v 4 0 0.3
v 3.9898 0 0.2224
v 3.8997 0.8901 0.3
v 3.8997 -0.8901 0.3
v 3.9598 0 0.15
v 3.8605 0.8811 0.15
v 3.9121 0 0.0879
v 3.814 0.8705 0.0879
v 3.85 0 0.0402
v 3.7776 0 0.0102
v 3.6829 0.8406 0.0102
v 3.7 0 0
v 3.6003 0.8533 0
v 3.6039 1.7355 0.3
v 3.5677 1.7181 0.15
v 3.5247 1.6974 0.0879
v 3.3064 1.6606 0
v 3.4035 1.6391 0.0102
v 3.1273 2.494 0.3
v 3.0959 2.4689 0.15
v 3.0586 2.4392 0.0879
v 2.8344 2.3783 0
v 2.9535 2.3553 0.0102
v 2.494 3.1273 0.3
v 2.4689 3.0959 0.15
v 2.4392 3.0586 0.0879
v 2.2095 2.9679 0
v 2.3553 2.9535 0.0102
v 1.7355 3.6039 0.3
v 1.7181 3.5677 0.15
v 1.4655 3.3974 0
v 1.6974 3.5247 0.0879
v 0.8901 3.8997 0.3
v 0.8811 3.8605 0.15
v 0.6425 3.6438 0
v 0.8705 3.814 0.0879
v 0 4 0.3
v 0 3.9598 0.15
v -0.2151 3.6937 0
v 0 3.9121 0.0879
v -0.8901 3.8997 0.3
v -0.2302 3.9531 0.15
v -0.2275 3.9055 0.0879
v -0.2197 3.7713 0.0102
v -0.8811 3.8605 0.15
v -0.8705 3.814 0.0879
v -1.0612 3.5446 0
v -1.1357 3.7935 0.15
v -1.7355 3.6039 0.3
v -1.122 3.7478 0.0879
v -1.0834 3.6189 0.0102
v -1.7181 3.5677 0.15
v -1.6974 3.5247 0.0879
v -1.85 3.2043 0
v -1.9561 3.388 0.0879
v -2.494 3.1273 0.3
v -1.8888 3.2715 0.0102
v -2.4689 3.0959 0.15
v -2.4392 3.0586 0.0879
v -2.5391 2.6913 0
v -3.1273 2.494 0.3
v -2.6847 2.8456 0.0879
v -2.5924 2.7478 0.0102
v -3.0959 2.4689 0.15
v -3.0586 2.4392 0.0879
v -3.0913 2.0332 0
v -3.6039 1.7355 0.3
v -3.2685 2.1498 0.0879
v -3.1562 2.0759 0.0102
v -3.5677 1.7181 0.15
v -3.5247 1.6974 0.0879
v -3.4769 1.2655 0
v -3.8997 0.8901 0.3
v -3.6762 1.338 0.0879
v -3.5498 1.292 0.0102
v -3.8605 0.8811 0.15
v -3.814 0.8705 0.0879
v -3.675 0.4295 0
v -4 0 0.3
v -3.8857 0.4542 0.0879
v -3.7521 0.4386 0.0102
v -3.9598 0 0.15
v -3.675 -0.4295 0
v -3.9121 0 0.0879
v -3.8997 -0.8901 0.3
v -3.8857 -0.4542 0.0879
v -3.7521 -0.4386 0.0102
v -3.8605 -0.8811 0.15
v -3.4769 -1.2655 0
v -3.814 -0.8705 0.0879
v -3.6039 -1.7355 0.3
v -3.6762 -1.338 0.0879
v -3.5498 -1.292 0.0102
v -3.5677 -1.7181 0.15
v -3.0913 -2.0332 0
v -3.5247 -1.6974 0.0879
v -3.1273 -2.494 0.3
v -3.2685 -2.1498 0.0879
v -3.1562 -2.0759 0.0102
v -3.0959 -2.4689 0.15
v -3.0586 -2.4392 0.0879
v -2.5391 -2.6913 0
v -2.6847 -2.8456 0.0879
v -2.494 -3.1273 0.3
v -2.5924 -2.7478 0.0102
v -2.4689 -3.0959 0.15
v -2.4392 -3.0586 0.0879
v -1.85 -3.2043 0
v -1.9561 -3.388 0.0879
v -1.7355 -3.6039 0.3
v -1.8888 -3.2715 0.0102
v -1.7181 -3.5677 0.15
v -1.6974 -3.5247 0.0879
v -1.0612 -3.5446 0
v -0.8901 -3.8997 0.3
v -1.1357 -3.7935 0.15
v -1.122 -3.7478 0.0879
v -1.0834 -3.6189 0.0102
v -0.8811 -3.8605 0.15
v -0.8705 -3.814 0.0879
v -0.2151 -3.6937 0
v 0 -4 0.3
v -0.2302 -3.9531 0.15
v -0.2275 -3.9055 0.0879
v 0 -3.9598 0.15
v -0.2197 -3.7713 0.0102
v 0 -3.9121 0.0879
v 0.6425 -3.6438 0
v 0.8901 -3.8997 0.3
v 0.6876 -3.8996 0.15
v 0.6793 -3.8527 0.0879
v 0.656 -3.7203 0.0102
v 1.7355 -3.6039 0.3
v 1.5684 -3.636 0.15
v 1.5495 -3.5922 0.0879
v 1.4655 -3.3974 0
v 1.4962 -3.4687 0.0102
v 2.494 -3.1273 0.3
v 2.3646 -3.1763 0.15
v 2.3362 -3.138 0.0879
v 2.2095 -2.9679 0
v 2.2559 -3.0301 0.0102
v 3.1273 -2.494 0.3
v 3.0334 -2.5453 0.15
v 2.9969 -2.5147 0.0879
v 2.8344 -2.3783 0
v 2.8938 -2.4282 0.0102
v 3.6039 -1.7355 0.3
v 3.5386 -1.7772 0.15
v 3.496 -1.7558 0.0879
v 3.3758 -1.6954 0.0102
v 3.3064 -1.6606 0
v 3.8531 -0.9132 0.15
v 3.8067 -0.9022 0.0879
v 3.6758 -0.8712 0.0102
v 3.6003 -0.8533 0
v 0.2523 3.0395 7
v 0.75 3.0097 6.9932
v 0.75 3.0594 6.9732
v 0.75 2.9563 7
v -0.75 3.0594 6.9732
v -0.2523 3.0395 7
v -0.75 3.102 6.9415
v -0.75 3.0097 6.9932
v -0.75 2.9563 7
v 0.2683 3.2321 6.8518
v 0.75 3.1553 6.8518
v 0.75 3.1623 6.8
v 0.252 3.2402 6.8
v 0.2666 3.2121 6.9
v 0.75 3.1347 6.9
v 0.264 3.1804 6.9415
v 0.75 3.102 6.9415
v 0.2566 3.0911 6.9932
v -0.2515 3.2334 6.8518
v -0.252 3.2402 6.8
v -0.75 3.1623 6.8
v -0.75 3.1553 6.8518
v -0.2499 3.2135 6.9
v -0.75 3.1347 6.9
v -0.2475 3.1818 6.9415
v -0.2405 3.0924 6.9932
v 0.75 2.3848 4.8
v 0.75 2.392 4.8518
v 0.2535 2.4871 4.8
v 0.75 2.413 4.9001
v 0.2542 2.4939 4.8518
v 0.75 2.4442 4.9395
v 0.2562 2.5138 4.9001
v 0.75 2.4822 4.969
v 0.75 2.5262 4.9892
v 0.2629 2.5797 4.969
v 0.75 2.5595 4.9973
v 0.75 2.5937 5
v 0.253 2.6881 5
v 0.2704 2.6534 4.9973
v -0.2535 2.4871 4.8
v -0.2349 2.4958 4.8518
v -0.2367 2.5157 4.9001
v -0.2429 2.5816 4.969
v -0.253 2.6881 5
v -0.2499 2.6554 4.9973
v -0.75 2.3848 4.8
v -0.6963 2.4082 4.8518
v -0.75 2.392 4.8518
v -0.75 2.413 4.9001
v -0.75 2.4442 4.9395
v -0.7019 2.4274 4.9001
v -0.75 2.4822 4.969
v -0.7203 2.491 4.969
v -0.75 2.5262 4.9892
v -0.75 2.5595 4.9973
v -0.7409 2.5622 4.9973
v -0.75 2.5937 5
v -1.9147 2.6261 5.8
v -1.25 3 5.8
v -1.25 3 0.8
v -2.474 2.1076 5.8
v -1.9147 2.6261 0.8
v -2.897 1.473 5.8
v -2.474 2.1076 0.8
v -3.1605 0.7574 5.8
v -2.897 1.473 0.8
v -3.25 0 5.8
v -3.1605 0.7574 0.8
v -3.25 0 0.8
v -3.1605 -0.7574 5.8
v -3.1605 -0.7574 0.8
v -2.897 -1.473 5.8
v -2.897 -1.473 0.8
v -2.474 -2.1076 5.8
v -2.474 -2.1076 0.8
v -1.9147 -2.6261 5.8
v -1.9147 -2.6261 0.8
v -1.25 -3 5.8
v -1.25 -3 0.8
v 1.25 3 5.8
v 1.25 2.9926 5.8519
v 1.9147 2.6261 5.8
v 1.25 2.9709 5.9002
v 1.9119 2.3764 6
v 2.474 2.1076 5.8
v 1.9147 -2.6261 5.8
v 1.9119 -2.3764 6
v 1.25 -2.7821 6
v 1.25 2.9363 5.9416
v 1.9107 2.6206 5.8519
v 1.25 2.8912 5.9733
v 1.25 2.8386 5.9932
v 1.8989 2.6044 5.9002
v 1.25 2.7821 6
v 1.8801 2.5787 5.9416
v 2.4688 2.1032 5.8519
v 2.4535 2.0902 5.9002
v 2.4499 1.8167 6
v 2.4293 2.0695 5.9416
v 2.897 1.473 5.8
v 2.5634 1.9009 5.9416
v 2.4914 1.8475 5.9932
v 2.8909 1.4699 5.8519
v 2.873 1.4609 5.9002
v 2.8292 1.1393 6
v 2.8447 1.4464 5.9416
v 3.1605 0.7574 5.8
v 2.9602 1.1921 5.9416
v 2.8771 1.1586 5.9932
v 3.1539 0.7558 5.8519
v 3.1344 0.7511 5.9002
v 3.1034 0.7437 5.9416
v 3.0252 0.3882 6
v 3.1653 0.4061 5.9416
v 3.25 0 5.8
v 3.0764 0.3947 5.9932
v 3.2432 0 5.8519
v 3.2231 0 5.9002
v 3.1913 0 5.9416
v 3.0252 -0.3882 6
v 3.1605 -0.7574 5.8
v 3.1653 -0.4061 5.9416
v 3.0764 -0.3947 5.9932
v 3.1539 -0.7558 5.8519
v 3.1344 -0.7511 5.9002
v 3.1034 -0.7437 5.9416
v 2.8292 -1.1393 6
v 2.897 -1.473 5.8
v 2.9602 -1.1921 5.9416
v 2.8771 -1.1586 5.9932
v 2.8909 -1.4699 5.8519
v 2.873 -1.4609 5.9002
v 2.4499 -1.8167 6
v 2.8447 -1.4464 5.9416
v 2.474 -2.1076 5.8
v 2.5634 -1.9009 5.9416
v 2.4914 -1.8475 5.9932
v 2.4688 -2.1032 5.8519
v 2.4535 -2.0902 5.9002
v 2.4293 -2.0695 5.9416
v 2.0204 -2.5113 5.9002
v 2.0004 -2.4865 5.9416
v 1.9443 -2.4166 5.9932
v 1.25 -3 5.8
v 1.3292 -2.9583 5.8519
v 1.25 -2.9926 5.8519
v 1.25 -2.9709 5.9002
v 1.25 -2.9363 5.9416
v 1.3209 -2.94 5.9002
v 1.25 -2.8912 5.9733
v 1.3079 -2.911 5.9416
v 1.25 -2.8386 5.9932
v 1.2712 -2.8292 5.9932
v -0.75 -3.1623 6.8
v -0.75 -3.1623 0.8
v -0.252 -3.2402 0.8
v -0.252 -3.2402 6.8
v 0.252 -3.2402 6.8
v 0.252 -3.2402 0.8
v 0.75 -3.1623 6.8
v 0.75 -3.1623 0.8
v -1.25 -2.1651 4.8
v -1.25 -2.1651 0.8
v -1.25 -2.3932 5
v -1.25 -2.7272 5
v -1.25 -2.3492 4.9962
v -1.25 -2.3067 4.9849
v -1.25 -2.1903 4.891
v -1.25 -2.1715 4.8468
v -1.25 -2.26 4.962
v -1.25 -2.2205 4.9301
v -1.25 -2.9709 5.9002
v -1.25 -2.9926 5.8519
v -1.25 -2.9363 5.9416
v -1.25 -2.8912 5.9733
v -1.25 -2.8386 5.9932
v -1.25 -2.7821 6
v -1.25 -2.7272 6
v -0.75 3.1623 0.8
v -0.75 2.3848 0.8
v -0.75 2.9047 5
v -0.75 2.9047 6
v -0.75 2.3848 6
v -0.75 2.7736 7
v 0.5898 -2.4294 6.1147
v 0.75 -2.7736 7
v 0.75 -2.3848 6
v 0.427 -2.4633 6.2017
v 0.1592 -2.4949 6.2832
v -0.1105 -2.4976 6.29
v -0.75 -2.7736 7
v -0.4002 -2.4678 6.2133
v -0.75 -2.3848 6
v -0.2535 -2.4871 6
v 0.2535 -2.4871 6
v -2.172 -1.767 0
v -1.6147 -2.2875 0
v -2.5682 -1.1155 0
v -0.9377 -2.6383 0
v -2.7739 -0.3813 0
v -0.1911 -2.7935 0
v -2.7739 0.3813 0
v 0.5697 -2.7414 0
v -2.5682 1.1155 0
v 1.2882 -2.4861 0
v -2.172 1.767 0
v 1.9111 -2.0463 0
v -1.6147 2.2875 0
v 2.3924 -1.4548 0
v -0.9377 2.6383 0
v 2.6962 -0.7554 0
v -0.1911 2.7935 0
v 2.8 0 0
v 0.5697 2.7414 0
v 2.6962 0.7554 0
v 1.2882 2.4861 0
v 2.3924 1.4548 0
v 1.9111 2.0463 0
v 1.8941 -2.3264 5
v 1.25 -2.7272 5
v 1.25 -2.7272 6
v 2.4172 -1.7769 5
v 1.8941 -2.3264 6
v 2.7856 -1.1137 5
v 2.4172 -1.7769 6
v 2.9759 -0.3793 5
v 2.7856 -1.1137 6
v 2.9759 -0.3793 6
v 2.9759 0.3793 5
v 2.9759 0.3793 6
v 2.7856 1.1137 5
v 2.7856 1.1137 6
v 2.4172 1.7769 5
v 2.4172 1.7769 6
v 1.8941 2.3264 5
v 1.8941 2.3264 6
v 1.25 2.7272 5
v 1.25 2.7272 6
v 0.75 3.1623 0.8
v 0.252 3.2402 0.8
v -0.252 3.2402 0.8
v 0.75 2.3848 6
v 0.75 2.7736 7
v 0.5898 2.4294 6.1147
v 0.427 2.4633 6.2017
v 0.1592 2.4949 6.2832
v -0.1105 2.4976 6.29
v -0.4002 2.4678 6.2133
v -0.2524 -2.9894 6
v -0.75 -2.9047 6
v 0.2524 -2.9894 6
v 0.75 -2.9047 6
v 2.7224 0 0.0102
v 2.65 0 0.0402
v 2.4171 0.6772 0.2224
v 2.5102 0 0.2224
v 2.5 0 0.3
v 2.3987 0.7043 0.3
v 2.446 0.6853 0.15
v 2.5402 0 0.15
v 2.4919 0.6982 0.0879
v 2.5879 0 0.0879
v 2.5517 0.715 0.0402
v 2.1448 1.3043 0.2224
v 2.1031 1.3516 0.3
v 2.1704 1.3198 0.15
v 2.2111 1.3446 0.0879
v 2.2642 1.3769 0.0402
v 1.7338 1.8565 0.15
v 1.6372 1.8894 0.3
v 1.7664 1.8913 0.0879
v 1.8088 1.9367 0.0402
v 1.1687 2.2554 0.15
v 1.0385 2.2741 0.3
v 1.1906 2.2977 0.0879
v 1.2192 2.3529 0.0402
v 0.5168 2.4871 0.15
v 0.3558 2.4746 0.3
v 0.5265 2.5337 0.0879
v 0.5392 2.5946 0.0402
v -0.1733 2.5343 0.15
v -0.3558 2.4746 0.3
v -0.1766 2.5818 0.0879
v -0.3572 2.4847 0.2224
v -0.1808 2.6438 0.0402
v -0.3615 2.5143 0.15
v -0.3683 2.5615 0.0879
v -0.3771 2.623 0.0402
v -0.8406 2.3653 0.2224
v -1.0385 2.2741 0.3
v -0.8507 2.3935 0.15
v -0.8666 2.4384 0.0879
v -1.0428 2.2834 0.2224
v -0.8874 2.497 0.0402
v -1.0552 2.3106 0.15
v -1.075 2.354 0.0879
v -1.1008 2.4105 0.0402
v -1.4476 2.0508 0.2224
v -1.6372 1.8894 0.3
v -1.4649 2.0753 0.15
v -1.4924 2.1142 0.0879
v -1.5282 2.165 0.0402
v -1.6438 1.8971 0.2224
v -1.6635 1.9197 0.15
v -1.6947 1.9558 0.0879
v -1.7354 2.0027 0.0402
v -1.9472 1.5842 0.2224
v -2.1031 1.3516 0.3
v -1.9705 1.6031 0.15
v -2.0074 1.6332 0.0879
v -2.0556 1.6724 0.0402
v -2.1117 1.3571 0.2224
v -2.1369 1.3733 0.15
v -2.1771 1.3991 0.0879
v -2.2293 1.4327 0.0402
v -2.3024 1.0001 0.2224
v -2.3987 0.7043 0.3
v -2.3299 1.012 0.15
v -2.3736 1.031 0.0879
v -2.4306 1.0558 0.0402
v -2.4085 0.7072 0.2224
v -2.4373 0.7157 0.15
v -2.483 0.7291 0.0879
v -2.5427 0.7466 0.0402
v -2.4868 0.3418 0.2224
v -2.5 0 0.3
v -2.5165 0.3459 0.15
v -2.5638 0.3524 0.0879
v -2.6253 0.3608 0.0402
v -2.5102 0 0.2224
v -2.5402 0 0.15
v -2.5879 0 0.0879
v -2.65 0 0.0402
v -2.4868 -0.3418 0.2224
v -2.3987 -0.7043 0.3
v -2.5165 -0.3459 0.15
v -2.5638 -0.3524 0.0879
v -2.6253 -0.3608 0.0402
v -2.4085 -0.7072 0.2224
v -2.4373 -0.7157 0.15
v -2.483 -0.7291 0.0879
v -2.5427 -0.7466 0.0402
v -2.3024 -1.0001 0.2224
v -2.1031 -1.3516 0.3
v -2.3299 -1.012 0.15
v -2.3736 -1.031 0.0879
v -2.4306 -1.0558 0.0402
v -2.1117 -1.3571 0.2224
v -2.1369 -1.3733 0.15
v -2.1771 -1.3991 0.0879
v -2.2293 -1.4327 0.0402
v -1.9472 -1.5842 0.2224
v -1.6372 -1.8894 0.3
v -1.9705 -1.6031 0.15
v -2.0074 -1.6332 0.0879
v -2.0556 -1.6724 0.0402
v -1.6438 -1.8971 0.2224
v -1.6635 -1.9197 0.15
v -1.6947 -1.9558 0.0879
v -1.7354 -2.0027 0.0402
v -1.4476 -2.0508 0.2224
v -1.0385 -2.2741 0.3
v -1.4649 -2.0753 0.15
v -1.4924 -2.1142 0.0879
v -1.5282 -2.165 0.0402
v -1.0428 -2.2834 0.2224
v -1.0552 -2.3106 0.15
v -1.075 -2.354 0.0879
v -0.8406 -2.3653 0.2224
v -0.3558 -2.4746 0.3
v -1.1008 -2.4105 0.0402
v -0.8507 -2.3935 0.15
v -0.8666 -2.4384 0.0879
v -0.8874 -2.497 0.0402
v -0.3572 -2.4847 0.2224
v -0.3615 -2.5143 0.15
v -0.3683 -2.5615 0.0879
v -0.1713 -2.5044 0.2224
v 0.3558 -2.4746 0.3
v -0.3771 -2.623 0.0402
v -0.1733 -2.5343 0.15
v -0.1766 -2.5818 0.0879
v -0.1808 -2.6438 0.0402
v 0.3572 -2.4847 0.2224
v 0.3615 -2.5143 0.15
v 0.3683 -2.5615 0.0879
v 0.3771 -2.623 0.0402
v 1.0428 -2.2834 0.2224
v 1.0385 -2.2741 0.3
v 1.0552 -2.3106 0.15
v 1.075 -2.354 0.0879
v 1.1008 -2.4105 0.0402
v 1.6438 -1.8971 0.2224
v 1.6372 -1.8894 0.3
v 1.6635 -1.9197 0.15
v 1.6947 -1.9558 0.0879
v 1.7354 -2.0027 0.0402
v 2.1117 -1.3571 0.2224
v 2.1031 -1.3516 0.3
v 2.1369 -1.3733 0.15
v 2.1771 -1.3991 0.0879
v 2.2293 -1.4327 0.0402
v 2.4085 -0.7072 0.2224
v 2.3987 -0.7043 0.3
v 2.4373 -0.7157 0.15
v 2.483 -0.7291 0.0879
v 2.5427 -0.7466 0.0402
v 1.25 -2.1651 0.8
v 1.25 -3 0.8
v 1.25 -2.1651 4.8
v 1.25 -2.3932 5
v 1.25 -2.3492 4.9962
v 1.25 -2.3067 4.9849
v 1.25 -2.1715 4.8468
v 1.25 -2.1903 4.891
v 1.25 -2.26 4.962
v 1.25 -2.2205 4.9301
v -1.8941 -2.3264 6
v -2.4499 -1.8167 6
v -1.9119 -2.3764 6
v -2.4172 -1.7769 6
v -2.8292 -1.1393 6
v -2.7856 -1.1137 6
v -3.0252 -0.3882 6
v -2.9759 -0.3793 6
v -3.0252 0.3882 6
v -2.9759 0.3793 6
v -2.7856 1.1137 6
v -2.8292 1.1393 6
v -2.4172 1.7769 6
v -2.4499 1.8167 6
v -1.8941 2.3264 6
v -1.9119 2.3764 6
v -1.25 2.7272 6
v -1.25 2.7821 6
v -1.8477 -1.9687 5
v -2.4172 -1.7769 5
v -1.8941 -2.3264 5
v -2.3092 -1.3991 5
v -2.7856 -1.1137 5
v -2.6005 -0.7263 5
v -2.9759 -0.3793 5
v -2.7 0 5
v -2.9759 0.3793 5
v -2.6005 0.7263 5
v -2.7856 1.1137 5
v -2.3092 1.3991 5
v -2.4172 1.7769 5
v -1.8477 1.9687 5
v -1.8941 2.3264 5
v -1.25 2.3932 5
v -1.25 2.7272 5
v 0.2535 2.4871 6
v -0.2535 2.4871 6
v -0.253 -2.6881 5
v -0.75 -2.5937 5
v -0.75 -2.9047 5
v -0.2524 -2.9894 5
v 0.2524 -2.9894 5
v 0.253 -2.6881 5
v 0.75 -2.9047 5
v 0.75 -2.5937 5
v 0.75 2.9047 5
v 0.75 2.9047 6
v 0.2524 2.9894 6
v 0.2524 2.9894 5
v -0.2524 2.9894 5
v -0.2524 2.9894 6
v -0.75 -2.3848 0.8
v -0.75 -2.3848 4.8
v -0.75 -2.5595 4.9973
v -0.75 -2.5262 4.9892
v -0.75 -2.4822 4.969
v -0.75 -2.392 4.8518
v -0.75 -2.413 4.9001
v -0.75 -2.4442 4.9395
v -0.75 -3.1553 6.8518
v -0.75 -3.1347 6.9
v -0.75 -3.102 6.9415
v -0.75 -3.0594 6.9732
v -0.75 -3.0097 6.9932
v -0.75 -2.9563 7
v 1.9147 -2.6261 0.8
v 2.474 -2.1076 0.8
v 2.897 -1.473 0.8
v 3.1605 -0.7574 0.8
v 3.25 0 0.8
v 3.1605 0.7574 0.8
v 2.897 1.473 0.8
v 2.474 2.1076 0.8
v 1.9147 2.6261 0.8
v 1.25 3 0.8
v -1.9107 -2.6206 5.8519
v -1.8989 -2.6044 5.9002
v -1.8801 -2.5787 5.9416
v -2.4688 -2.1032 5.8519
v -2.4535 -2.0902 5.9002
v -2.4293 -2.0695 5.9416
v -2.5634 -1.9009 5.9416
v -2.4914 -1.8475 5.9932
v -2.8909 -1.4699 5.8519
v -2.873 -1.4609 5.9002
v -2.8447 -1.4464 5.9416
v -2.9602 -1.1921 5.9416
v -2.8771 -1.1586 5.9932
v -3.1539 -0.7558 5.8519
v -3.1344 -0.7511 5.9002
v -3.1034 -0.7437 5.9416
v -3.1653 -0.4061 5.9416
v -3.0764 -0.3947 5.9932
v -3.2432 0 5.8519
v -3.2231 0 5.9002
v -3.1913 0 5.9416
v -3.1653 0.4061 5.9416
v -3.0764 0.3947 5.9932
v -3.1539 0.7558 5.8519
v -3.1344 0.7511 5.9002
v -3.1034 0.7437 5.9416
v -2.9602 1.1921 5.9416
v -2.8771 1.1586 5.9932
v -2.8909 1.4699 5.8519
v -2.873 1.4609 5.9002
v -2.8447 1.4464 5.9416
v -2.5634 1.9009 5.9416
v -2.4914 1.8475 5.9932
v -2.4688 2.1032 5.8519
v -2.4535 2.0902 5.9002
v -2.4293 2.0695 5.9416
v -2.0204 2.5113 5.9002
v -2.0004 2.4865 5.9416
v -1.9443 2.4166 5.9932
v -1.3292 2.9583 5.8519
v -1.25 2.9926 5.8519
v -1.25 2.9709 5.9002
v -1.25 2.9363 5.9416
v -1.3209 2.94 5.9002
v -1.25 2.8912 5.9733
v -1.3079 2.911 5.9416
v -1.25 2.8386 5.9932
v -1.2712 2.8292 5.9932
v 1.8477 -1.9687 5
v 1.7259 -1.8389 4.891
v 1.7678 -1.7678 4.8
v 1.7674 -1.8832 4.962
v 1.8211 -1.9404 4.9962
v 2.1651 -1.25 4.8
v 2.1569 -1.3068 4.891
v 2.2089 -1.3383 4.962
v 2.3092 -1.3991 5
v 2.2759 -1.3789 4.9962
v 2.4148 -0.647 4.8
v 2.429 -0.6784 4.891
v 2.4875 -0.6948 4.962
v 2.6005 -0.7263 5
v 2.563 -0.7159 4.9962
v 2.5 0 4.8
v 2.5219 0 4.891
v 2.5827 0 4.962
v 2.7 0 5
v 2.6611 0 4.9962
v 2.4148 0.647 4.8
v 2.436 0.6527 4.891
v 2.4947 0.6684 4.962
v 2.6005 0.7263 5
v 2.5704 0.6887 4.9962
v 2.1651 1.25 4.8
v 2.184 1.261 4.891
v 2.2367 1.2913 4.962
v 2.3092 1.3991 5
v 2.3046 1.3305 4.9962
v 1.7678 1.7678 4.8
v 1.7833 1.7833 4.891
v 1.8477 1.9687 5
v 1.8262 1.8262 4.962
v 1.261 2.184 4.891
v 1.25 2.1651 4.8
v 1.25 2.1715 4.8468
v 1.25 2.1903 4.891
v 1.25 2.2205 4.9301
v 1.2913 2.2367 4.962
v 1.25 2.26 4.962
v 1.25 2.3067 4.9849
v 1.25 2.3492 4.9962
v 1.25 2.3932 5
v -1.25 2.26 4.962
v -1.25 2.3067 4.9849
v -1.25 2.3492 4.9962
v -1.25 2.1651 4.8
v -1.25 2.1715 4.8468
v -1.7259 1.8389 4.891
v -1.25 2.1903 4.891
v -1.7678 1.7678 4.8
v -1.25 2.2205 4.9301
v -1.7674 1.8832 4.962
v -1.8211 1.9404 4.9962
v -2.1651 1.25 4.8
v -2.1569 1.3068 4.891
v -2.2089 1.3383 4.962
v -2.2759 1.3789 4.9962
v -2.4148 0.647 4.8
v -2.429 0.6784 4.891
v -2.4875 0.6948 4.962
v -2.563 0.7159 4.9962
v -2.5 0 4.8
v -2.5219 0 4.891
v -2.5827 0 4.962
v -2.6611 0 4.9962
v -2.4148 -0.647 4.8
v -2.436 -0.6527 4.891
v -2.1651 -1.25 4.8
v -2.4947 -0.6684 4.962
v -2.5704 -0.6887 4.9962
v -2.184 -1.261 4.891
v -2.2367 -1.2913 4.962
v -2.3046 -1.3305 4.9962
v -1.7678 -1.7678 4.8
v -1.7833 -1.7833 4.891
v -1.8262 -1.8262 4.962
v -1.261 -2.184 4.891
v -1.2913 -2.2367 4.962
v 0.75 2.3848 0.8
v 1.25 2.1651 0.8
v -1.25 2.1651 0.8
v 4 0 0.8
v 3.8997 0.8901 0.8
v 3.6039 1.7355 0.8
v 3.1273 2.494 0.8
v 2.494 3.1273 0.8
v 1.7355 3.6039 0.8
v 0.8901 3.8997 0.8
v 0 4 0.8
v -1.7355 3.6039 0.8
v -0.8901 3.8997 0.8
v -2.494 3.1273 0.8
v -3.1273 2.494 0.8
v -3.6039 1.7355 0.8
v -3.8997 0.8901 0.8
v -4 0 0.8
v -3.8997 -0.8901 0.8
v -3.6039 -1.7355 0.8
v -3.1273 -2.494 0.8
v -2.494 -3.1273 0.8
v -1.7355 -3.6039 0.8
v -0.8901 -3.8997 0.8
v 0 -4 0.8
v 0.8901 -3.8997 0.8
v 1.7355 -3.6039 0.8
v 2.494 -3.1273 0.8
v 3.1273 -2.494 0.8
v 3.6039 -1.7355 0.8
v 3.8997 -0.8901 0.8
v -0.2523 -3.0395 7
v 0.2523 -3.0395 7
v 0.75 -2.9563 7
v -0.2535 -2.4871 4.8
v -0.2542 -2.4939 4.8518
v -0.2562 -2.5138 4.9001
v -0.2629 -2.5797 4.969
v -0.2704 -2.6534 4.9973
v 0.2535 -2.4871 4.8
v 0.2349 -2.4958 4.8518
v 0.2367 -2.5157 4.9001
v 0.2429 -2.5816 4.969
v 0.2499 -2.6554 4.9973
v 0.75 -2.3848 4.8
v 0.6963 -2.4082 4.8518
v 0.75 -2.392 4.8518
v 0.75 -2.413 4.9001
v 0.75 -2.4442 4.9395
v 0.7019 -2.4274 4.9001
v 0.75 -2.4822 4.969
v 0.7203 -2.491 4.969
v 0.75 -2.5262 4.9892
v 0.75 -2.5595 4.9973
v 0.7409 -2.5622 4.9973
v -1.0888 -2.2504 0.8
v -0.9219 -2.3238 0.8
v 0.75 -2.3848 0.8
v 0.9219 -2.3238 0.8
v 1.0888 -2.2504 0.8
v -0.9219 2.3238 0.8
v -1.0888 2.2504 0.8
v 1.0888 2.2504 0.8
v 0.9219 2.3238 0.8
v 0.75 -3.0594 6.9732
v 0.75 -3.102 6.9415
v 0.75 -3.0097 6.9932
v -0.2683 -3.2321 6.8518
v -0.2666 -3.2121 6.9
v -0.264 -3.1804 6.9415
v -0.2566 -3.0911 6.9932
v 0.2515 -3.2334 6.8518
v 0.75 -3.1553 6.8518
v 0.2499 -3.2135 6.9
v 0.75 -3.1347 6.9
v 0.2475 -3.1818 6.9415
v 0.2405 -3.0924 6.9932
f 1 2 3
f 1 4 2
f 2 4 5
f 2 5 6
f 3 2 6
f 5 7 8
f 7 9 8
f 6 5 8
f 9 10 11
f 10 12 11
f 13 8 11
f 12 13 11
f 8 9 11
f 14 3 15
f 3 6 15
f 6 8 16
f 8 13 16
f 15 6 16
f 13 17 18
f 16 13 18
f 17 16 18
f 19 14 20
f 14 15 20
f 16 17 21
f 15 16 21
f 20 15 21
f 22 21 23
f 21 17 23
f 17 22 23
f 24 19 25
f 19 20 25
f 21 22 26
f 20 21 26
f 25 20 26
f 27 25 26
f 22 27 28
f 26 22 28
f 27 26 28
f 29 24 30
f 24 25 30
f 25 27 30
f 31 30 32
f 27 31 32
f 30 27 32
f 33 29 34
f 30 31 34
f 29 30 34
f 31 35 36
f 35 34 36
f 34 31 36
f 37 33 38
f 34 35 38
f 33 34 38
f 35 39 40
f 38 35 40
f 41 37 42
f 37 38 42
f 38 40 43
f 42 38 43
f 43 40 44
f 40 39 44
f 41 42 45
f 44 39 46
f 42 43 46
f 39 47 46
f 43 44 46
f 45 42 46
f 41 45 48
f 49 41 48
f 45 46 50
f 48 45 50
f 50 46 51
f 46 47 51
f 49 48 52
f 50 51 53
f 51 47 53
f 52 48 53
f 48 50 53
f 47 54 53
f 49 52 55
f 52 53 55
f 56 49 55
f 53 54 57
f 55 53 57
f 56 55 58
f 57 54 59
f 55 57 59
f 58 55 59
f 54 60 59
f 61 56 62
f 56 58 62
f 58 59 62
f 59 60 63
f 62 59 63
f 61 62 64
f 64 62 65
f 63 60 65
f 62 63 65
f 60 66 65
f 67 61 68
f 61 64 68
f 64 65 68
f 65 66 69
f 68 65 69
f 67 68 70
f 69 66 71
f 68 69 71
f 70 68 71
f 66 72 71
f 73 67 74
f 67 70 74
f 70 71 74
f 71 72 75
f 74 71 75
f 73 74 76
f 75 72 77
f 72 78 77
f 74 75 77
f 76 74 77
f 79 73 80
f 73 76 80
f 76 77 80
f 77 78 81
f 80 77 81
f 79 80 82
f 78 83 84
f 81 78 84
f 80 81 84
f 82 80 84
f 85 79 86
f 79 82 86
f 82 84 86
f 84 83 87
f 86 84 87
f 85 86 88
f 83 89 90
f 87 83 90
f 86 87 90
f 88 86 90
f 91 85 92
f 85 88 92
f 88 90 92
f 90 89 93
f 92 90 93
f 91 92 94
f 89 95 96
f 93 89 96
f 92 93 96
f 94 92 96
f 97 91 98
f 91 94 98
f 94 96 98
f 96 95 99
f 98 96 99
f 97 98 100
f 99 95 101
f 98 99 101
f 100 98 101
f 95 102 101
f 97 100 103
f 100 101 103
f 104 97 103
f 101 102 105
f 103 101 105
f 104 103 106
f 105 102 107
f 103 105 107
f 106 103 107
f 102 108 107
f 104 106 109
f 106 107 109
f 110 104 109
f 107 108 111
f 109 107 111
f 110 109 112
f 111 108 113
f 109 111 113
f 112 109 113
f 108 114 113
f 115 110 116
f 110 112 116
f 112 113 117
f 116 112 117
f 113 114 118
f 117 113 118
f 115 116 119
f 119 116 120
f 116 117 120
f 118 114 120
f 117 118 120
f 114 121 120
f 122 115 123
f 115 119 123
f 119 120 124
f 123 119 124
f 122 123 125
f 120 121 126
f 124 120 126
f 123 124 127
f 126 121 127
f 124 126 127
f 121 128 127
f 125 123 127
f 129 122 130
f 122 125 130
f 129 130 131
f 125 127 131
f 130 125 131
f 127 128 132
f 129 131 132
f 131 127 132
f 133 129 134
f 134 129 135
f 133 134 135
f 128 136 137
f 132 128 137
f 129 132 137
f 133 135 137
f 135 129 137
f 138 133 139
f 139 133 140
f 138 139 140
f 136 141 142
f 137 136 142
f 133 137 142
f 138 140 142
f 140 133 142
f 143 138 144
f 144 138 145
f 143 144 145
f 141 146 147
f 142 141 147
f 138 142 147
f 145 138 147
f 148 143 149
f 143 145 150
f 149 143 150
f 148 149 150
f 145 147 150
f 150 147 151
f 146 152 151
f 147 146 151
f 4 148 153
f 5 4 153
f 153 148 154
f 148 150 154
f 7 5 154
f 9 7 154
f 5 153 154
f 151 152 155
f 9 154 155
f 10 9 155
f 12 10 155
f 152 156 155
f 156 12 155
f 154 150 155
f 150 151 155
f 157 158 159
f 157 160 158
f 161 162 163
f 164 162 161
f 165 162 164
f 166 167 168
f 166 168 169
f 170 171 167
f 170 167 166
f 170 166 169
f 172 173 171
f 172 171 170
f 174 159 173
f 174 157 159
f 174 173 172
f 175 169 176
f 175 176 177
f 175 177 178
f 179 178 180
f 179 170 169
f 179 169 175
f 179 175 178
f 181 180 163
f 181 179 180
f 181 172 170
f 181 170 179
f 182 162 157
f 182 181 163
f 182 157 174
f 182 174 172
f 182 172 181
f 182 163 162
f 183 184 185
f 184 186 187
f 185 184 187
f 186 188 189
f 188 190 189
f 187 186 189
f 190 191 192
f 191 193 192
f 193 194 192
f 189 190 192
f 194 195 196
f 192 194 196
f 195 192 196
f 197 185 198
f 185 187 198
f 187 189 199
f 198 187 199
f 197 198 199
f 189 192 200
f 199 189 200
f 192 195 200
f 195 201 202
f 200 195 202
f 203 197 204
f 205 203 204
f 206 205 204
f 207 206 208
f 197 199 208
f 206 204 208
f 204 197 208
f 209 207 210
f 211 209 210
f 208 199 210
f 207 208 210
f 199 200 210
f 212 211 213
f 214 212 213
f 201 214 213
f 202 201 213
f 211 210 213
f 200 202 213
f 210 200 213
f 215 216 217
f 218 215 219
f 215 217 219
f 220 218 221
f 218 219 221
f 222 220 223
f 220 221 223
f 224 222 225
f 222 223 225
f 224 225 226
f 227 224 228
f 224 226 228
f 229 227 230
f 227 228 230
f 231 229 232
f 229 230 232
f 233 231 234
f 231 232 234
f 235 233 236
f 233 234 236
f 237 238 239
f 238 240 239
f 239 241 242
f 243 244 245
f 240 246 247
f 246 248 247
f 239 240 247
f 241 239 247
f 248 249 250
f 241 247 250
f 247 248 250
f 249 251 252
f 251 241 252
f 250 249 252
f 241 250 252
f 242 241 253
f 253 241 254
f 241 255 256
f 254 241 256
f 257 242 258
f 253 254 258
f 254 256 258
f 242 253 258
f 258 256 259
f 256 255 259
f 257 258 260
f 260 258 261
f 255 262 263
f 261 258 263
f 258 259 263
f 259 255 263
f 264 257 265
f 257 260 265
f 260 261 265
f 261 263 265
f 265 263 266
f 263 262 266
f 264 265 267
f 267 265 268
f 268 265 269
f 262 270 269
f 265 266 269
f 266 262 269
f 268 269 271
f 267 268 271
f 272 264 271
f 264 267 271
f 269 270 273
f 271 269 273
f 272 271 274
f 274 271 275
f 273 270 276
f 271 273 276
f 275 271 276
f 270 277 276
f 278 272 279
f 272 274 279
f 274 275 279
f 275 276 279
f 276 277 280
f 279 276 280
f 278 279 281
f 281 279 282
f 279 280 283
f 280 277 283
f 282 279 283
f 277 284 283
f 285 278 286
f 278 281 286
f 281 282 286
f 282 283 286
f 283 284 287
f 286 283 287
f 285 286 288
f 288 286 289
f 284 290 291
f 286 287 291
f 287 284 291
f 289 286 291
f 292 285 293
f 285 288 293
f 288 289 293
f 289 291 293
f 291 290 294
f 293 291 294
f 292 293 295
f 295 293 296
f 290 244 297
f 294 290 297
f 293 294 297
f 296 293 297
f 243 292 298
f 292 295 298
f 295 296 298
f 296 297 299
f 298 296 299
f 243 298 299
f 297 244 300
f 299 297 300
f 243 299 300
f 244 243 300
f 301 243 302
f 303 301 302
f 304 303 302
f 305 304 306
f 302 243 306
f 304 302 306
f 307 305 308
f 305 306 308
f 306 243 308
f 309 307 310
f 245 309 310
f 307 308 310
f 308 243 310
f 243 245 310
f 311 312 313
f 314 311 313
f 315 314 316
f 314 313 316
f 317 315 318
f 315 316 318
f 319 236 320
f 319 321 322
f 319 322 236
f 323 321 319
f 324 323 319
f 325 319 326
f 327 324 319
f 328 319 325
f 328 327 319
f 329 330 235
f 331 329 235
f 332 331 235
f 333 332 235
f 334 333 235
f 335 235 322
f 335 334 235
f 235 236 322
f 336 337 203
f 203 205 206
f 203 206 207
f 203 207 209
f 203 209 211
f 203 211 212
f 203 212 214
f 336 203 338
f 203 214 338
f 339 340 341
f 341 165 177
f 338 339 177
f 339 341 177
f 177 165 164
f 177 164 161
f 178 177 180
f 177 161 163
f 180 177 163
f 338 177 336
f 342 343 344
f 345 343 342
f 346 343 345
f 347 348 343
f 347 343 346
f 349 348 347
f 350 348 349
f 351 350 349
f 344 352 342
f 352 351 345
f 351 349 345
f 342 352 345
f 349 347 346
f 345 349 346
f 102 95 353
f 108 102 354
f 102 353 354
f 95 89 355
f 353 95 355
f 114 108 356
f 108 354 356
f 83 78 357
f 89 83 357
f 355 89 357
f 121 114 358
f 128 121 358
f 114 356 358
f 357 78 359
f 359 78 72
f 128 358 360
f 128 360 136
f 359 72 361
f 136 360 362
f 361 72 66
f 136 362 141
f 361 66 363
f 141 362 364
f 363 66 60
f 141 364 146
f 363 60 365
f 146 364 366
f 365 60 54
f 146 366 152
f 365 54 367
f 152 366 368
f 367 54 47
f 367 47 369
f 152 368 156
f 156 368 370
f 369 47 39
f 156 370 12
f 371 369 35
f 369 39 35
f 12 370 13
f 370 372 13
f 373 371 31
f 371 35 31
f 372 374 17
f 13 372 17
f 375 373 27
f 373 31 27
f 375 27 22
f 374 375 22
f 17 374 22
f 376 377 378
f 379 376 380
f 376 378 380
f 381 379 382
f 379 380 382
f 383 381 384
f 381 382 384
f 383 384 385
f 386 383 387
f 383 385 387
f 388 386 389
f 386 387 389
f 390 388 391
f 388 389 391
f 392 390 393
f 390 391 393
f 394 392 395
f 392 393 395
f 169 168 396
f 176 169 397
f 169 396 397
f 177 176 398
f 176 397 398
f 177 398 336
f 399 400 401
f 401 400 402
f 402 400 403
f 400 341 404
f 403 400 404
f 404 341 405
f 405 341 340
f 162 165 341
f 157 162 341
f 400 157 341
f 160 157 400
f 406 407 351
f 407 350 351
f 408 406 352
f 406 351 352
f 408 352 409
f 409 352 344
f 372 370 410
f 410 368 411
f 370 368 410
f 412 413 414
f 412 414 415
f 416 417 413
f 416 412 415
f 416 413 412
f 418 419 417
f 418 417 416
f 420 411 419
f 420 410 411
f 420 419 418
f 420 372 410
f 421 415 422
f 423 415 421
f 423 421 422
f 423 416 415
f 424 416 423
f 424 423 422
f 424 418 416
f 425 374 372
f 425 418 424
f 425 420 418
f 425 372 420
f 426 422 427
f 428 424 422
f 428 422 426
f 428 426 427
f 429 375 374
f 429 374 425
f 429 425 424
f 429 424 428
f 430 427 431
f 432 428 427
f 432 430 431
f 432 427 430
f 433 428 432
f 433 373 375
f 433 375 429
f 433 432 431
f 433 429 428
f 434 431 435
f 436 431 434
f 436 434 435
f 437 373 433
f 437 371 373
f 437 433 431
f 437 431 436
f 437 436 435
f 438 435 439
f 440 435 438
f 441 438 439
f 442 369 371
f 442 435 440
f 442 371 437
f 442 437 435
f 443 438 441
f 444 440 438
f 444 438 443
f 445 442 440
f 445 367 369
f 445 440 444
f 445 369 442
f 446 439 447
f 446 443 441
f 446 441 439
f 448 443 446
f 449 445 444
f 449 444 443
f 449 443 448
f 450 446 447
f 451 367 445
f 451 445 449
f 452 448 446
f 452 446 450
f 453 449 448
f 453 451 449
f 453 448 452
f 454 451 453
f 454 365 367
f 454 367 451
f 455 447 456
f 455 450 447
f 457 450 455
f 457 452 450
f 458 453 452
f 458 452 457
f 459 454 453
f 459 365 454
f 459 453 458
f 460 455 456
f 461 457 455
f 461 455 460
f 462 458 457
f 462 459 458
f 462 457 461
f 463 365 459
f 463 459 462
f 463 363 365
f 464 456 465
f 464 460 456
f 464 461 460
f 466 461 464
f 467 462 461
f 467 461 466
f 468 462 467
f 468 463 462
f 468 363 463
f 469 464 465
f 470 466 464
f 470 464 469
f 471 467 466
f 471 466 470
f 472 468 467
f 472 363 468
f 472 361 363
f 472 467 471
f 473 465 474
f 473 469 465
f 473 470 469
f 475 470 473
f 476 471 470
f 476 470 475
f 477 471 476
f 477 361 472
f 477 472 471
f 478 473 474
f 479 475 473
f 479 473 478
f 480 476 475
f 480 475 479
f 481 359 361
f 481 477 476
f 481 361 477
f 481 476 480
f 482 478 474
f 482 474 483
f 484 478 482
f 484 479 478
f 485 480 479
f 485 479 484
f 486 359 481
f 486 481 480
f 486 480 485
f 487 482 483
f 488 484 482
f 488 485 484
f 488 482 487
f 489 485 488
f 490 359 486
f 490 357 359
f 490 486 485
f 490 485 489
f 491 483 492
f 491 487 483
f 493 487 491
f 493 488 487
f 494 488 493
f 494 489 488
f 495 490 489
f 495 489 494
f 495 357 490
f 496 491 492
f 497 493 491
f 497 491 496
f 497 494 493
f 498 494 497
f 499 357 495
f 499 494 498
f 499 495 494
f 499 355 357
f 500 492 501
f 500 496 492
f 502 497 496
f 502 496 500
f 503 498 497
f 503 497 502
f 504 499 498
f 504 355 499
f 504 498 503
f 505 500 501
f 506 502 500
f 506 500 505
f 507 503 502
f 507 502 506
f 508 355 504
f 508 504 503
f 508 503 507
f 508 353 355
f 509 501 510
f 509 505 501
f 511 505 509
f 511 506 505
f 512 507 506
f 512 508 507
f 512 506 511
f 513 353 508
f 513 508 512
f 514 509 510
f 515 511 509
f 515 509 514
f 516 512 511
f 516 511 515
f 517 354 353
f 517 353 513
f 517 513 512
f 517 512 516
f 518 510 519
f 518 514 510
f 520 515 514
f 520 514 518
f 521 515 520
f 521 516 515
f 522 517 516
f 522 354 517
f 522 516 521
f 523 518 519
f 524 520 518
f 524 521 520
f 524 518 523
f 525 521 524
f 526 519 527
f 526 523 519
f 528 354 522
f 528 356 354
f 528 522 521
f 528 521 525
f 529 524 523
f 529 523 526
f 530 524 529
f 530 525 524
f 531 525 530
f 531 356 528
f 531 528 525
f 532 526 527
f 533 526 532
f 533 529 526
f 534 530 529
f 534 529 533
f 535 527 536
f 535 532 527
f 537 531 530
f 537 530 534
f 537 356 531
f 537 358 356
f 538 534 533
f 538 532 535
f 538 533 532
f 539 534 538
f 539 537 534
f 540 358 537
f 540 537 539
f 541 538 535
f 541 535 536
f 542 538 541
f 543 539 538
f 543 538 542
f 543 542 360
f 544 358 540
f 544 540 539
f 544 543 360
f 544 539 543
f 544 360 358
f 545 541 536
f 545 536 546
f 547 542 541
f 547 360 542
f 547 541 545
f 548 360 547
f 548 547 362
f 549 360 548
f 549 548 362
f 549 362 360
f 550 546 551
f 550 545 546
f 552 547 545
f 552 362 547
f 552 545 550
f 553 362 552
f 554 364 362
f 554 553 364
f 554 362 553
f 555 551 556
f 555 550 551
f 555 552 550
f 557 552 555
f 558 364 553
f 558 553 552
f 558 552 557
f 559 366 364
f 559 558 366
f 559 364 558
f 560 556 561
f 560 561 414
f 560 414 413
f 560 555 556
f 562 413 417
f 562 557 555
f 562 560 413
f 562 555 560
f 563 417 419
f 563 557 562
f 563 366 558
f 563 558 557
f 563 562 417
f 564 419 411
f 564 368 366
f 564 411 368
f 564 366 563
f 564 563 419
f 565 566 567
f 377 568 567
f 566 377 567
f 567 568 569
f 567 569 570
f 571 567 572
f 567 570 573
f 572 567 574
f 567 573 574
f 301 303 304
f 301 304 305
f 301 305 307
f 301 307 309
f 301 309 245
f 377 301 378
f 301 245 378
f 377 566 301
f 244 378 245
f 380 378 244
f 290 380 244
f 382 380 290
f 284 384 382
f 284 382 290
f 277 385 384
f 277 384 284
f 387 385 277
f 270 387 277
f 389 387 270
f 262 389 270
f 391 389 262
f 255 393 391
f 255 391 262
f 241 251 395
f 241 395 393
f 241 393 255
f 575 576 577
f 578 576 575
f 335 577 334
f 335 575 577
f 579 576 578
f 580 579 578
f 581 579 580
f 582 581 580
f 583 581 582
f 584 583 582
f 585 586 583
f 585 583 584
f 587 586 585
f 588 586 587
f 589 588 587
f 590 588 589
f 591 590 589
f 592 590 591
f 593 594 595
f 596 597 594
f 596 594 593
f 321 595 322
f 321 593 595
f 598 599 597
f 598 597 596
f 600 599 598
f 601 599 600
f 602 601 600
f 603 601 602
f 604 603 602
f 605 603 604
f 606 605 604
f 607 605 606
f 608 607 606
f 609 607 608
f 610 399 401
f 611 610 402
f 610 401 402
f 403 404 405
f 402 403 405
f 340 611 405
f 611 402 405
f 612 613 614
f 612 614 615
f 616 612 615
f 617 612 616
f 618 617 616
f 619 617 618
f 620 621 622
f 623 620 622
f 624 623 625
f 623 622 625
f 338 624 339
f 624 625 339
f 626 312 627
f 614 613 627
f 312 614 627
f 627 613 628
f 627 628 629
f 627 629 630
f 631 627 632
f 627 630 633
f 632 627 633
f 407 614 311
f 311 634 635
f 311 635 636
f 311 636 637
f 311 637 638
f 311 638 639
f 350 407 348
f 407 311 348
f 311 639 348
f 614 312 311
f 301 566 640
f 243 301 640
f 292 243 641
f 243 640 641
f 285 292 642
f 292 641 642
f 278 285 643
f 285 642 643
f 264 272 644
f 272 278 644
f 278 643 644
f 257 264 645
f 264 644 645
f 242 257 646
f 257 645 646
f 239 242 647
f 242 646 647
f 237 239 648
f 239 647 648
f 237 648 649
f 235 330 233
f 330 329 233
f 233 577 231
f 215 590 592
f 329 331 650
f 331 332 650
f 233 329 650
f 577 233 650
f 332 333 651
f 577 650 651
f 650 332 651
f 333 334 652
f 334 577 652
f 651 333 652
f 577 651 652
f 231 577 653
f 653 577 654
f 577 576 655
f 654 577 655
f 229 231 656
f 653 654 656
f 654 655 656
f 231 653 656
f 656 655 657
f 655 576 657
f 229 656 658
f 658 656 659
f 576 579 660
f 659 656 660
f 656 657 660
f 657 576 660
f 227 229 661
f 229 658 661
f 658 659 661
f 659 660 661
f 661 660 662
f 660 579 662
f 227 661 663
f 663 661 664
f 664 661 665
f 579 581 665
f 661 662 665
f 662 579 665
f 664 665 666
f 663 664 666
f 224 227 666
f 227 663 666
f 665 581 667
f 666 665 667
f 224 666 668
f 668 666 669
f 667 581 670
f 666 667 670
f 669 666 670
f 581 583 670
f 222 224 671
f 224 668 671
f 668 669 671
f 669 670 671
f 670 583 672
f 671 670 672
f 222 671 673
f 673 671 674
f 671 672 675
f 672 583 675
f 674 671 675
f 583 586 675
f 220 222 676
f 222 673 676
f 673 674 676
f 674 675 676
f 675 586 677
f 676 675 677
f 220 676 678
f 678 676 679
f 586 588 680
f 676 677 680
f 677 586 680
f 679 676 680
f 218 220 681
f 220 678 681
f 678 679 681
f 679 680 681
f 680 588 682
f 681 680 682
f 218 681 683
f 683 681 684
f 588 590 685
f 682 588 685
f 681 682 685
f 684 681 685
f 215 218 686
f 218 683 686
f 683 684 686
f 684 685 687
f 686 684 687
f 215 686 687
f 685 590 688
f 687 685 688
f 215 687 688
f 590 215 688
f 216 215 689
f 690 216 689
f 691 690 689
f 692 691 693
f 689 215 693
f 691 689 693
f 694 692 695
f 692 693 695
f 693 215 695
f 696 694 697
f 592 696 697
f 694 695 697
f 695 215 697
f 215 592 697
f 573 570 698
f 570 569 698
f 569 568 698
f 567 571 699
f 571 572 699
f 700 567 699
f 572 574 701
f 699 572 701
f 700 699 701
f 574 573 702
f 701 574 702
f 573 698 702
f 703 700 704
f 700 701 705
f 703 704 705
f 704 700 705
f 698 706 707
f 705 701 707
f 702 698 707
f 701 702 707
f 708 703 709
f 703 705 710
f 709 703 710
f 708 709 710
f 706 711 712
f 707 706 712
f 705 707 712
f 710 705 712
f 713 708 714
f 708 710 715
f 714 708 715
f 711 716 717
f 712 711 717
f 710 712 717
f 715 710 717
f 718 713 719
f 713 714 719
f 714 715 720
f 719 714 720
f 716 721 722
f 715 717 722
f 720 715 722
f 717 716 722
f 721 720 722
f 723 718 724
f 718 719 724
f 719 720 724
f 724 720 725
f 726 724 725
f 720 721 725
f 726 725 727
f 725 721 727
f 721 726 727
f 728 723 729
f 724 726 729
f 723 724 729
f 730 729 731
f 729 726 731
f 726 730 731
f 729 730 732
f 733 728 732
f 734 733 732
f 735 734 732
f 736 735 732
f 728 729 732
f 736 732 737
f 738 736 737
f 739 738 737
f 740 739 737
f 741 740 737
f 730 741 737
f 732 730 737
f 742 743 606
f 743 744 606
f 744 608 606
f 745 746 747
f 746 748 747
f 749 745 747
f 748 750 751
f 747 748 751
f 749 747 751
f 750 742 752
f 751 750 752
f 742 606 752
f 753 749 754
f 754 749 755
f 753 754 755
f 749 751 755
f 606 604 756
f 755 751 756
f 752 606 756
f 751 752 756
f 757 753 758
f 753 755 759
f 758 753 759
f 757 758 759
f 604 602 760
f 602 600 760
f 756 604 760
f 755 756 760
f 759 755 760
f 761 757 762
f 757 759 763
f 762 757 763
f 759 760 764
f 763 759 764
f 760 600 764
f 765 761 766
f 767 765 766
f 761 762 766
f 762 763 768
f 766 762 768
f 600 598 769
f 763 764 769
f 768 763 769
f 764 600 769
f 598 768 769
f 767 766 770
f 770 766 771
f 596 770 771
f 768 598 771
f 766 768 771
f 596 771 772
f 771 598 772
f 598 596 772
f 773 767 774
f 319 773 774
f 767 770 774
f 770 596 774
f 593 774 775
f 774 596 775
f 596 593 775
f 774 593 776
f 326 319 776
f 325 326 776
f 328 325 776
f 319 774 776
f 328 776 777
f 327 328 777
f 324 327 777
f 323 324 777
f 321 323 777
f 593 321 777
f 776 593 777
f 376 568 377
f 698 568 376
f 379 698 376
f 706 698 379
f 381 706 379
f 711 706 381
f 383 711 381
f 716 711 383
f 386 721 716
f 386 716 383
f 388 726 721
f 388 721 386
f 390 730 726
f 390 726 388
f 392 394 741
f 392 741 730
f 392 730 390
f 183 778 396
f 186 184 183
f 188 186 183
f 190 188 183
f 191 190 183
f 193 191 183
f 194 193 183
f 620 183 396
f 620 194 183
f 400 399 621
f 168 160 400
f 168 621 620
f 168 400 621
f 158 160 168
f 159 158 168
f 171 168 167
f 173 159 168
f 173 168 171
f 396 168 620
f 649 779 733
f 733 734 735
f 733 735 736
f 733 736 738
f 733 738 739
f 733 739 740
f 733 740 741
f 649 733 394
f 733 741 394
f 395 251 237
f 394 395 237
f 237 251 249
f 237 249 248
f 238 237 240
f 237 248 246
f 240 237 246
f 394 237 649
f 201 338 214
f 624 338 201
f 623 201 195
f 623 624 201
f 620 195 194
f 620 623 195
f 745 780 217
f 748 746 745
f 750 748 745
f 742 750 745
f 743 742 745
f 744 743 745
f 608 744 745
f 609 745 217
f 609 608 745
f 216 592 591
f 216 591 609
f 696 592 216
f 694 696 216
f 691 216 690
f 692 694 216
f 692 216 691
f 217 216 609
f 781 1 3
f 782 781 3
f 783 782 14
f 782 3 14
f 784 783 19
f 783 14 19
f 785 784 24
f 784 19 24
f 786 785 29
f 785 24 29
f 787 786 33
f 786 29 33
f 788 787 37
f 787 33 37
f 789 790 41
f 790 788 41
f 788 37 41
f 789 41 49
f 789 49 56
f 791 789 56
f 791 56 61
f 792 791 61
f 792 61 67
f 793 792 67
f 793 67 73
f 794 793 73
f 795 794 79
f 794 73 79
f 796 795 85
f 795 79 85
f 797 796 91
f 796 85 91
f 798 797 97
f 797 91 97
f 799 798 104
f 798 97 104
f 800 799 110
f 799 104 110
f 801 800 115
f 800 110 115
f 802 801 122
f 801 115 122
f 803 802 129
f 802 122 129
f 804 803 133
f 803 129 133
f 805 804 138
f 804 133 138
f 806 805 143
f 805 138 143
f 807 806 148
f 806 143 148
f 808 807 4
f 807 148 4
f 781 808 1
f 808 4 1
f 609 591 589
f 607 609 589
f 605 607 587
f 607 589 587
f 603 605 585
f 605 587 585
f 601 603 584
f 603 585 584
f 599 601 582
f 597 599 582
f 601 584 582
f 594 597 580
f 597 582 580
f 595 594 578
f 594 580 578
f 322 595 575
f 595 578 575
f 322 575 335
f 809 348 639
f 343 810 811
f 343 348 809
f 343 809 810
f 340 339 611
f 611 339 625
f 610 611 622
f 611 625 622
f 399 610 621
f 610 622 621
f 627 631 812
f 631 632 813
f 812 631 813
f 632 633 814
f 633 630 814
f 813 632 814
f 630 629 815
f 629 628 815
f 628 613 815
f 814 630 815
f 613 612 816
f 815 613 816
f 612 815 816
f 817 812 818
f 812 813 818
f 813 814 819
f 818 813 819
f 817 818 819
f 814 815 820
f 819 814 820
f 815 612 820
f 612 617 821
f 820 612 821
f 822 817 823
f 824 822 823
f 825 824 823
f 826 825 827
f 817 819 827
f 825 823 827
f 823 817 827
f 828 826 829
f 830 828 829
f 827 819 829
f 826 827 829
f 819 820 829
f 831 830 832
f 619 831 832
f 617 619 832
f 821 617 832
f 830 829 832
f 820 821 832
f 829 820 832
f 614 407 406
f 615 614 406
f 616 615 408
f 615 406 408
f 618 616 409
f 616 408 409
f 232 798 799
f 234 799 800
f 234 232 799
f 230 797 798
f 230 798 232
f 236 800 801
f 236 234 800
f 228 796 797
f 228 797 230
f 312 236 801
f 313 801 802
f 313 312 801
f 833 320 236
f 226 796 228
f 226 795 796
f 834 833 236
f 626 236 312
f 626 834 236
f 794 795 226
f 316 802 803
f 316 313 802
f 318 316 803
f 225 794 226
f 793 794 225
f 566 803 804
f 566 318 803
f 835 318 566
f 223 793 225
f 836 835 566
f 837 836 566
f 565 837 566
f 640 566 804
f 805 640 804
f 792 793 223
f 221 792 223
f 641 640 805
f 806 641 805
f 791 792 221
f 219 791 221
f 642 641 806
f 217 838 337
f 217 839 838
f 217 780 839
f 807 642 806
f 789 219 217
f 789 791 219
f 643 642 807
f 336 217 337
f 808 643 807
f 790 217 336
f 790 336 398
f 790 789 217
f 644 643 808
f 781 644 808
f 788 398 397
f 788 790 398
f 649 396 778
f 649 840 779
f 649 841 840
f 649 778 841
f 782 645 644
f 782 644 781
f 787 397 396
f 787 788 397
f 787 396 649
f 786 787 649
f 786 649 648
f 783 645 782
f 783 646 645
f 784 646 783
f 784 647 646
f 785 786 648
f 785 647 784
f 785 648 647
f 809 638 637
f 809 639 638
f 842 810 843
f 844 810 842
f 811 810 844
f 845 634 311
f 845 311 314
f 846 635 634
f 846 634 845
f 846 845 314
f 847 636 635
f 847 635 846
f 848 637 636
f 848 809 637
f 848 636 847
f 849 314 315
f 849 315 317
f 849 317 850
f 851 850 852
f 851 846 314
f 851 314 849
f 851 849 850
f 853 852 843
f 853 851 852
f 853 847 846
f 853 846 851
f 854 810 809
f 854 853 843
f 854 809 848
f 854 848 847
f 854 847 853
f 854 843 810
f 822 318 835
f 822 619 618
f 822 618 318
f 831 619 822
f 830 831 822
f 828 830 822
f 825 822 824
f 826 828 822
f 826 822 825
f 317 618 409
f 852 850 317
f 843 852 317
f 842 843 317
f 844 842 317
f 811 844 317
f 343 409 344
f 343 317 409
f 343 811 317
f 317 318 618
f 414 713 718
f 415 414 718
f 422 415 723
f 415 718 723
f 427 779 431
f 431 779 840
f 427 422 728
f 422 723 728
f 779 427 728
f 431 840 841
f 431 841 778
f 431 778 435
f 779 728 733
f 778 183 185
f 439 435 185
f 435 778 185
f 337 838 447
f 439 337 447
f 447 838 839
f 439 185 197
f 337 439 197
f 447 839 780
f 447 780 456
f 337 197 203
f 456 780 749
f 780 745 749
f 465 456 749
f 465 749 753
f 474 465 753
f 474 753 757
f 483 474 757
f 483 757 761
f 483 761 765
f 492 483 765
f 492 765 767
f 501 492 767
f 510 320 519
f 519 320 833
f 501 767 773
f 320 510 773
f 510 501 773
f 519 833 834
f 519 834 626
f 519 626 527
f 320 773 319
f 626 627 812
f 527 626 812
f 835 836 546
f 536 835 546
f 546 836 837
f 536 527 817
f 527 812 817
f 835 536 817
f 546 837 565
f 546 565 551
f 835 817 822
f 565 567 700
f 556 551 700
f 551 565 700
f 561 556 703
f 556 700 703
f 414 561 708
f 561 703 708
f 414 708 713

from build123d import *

# Parameters (mm, degrees)
SKETCH_1_R               = 4
EXTRUDE_1_DEPTH          = 0.8
SKETCH_2_R               = 3.25
EXTRUDE_2_DEPTH          = 6.2
SKETCH_3_R               = 2.5
CUT_EXTRUDE_1_DEPTH      = 1
CUT_EXTRUDE_1_DEPTH_BACK = 8
SKETCH_4_W               = 0.5
SKETCH_4_H               = 8
CUT_EXTRUDE_2_DEPTH      = 6.2
SKETCH_5_W               = 2
SKETCH_5_H               = 6
CUT_EXTRUDE_3_DEPTH      = 1
SKETCH_6_R               = 3
CUT_EXTRUDE_4_DEPTH      = 1
CUT_EXTRUDE_5_DEPTH      = 5.75
FILLET_1_R               = 0.3
FILLET_2_R               = 0.2


with BuildPart() as part:
    # Эскиз1 → Бобышка-Вытянуть1 (new body)
    with BuildSketch(Plane.XY):
        Circle(SKETCH_1_R)
    extrude(amount=EXTRUDE_1_DEPTH)

    # Эскиз2 → Бобышка-Вытянуть2 (add)
    with BuildSketch(Plane.XY.offset(0.8)):
        Circle(SKETCH_2_R)
    extrude(amount=EXTRUDE_2_DEPTH)

    # Эскиз3 → Вырез-Вытянуть1 (cut, two sides)
    with BuildSketch(Plane.XY.offset(7)) as cut_extrude_1_sk:
        Circle(SKETCH_3_R)
    extrude(amount=CUT_EXTRUDE_1_DEPTH, mode=Mode.SUBTRACT)
    extrude(cut_extrude_1_sk.sketch, amount=-CUT_EXTRUDE_1_DEPTH_BACK, mode=Mode.SUBTRACT)

    # Эскиз4 → Вырез-Вытянуть2 (cut)
    with BuildSketch(Plane.XY.offset(7)):
        with Locations((-1, 0)):
            Rectangle(SKETCH_4_W, SKETCH_4_H)
        with Locations((1, 0)):
            Rectangle(SKETCH_4_W, SKETCH_4_H)
    extrude(amount=-CUT_EXTRUDE_2_DEPTH, mode=Mode.SUBTRACT)

    # Эскиз5 → Вырез-Вытянуть3 (cut)
    with BuildSketch(Plane.XY.offset(7)):
        with Locations((-2.25, 0)):
            Rectangle(SKETCH_5_W, SKETCH_5_H)
        with Locations((2.25, 0)):
            Rectangle(SKETCH_5_W, SKETCH_5_H)
    extrude(amount=-CUT_EXTRUDE_3_DEPTH, mode=Mode.SUBTRACT)

    # Эскиз6 → Вырез-Вытянуть4 (cut)
    with BuildSketch(Plane.XY.offset(6)):
        Circle(SKETCH_6_R)
    extrude(amount=-CUT_EXTRUDE_4_DEPTH, mode=Mode.SUBTRACT)

    # Эскиз7 → Вырез-Вытянуть5 (cut, through all)
    with BuildSketch(Plane.ZY.offset(0.75)):
        Polygon((7, 2.773562832), (6, 2.384848004), (7, 2.384848004), align=None)
        Polygon((7, -2.773562832), (6, -2.384848004), (7, -2.384848004), align=None)
    extrude(amount=-CUT_EXTRUDE_5_DEPTH, mode=Mode.SUBTRACT)

    # Скругление1
    fillet_1_edges = [part.edges().sort_by_distance(p)[0] for p in [
        (-2.5, 0, 0),
        (-4, 0, 0),
    ]]
    fillet(fillet_1_edges, radius=FILLET_1_R)

    # Скругление2
    fillet_2_edges = [part.edges().sort_by_distance(p)[0] for p in [
        (-3.25, 0, 6),
        (3.25, 0, 6),
        (2.165063509, -1.25, 5),
        (0, -2.5, 5),
        (-2.5, 0, 5),
        (0, 2.5, 5),
        (0, -3.25, 7),
        (0, 3.25, 7),
    ]]
    fillet(fillet_2_edges, radius=FILLET_2_R)


solid = part.part
